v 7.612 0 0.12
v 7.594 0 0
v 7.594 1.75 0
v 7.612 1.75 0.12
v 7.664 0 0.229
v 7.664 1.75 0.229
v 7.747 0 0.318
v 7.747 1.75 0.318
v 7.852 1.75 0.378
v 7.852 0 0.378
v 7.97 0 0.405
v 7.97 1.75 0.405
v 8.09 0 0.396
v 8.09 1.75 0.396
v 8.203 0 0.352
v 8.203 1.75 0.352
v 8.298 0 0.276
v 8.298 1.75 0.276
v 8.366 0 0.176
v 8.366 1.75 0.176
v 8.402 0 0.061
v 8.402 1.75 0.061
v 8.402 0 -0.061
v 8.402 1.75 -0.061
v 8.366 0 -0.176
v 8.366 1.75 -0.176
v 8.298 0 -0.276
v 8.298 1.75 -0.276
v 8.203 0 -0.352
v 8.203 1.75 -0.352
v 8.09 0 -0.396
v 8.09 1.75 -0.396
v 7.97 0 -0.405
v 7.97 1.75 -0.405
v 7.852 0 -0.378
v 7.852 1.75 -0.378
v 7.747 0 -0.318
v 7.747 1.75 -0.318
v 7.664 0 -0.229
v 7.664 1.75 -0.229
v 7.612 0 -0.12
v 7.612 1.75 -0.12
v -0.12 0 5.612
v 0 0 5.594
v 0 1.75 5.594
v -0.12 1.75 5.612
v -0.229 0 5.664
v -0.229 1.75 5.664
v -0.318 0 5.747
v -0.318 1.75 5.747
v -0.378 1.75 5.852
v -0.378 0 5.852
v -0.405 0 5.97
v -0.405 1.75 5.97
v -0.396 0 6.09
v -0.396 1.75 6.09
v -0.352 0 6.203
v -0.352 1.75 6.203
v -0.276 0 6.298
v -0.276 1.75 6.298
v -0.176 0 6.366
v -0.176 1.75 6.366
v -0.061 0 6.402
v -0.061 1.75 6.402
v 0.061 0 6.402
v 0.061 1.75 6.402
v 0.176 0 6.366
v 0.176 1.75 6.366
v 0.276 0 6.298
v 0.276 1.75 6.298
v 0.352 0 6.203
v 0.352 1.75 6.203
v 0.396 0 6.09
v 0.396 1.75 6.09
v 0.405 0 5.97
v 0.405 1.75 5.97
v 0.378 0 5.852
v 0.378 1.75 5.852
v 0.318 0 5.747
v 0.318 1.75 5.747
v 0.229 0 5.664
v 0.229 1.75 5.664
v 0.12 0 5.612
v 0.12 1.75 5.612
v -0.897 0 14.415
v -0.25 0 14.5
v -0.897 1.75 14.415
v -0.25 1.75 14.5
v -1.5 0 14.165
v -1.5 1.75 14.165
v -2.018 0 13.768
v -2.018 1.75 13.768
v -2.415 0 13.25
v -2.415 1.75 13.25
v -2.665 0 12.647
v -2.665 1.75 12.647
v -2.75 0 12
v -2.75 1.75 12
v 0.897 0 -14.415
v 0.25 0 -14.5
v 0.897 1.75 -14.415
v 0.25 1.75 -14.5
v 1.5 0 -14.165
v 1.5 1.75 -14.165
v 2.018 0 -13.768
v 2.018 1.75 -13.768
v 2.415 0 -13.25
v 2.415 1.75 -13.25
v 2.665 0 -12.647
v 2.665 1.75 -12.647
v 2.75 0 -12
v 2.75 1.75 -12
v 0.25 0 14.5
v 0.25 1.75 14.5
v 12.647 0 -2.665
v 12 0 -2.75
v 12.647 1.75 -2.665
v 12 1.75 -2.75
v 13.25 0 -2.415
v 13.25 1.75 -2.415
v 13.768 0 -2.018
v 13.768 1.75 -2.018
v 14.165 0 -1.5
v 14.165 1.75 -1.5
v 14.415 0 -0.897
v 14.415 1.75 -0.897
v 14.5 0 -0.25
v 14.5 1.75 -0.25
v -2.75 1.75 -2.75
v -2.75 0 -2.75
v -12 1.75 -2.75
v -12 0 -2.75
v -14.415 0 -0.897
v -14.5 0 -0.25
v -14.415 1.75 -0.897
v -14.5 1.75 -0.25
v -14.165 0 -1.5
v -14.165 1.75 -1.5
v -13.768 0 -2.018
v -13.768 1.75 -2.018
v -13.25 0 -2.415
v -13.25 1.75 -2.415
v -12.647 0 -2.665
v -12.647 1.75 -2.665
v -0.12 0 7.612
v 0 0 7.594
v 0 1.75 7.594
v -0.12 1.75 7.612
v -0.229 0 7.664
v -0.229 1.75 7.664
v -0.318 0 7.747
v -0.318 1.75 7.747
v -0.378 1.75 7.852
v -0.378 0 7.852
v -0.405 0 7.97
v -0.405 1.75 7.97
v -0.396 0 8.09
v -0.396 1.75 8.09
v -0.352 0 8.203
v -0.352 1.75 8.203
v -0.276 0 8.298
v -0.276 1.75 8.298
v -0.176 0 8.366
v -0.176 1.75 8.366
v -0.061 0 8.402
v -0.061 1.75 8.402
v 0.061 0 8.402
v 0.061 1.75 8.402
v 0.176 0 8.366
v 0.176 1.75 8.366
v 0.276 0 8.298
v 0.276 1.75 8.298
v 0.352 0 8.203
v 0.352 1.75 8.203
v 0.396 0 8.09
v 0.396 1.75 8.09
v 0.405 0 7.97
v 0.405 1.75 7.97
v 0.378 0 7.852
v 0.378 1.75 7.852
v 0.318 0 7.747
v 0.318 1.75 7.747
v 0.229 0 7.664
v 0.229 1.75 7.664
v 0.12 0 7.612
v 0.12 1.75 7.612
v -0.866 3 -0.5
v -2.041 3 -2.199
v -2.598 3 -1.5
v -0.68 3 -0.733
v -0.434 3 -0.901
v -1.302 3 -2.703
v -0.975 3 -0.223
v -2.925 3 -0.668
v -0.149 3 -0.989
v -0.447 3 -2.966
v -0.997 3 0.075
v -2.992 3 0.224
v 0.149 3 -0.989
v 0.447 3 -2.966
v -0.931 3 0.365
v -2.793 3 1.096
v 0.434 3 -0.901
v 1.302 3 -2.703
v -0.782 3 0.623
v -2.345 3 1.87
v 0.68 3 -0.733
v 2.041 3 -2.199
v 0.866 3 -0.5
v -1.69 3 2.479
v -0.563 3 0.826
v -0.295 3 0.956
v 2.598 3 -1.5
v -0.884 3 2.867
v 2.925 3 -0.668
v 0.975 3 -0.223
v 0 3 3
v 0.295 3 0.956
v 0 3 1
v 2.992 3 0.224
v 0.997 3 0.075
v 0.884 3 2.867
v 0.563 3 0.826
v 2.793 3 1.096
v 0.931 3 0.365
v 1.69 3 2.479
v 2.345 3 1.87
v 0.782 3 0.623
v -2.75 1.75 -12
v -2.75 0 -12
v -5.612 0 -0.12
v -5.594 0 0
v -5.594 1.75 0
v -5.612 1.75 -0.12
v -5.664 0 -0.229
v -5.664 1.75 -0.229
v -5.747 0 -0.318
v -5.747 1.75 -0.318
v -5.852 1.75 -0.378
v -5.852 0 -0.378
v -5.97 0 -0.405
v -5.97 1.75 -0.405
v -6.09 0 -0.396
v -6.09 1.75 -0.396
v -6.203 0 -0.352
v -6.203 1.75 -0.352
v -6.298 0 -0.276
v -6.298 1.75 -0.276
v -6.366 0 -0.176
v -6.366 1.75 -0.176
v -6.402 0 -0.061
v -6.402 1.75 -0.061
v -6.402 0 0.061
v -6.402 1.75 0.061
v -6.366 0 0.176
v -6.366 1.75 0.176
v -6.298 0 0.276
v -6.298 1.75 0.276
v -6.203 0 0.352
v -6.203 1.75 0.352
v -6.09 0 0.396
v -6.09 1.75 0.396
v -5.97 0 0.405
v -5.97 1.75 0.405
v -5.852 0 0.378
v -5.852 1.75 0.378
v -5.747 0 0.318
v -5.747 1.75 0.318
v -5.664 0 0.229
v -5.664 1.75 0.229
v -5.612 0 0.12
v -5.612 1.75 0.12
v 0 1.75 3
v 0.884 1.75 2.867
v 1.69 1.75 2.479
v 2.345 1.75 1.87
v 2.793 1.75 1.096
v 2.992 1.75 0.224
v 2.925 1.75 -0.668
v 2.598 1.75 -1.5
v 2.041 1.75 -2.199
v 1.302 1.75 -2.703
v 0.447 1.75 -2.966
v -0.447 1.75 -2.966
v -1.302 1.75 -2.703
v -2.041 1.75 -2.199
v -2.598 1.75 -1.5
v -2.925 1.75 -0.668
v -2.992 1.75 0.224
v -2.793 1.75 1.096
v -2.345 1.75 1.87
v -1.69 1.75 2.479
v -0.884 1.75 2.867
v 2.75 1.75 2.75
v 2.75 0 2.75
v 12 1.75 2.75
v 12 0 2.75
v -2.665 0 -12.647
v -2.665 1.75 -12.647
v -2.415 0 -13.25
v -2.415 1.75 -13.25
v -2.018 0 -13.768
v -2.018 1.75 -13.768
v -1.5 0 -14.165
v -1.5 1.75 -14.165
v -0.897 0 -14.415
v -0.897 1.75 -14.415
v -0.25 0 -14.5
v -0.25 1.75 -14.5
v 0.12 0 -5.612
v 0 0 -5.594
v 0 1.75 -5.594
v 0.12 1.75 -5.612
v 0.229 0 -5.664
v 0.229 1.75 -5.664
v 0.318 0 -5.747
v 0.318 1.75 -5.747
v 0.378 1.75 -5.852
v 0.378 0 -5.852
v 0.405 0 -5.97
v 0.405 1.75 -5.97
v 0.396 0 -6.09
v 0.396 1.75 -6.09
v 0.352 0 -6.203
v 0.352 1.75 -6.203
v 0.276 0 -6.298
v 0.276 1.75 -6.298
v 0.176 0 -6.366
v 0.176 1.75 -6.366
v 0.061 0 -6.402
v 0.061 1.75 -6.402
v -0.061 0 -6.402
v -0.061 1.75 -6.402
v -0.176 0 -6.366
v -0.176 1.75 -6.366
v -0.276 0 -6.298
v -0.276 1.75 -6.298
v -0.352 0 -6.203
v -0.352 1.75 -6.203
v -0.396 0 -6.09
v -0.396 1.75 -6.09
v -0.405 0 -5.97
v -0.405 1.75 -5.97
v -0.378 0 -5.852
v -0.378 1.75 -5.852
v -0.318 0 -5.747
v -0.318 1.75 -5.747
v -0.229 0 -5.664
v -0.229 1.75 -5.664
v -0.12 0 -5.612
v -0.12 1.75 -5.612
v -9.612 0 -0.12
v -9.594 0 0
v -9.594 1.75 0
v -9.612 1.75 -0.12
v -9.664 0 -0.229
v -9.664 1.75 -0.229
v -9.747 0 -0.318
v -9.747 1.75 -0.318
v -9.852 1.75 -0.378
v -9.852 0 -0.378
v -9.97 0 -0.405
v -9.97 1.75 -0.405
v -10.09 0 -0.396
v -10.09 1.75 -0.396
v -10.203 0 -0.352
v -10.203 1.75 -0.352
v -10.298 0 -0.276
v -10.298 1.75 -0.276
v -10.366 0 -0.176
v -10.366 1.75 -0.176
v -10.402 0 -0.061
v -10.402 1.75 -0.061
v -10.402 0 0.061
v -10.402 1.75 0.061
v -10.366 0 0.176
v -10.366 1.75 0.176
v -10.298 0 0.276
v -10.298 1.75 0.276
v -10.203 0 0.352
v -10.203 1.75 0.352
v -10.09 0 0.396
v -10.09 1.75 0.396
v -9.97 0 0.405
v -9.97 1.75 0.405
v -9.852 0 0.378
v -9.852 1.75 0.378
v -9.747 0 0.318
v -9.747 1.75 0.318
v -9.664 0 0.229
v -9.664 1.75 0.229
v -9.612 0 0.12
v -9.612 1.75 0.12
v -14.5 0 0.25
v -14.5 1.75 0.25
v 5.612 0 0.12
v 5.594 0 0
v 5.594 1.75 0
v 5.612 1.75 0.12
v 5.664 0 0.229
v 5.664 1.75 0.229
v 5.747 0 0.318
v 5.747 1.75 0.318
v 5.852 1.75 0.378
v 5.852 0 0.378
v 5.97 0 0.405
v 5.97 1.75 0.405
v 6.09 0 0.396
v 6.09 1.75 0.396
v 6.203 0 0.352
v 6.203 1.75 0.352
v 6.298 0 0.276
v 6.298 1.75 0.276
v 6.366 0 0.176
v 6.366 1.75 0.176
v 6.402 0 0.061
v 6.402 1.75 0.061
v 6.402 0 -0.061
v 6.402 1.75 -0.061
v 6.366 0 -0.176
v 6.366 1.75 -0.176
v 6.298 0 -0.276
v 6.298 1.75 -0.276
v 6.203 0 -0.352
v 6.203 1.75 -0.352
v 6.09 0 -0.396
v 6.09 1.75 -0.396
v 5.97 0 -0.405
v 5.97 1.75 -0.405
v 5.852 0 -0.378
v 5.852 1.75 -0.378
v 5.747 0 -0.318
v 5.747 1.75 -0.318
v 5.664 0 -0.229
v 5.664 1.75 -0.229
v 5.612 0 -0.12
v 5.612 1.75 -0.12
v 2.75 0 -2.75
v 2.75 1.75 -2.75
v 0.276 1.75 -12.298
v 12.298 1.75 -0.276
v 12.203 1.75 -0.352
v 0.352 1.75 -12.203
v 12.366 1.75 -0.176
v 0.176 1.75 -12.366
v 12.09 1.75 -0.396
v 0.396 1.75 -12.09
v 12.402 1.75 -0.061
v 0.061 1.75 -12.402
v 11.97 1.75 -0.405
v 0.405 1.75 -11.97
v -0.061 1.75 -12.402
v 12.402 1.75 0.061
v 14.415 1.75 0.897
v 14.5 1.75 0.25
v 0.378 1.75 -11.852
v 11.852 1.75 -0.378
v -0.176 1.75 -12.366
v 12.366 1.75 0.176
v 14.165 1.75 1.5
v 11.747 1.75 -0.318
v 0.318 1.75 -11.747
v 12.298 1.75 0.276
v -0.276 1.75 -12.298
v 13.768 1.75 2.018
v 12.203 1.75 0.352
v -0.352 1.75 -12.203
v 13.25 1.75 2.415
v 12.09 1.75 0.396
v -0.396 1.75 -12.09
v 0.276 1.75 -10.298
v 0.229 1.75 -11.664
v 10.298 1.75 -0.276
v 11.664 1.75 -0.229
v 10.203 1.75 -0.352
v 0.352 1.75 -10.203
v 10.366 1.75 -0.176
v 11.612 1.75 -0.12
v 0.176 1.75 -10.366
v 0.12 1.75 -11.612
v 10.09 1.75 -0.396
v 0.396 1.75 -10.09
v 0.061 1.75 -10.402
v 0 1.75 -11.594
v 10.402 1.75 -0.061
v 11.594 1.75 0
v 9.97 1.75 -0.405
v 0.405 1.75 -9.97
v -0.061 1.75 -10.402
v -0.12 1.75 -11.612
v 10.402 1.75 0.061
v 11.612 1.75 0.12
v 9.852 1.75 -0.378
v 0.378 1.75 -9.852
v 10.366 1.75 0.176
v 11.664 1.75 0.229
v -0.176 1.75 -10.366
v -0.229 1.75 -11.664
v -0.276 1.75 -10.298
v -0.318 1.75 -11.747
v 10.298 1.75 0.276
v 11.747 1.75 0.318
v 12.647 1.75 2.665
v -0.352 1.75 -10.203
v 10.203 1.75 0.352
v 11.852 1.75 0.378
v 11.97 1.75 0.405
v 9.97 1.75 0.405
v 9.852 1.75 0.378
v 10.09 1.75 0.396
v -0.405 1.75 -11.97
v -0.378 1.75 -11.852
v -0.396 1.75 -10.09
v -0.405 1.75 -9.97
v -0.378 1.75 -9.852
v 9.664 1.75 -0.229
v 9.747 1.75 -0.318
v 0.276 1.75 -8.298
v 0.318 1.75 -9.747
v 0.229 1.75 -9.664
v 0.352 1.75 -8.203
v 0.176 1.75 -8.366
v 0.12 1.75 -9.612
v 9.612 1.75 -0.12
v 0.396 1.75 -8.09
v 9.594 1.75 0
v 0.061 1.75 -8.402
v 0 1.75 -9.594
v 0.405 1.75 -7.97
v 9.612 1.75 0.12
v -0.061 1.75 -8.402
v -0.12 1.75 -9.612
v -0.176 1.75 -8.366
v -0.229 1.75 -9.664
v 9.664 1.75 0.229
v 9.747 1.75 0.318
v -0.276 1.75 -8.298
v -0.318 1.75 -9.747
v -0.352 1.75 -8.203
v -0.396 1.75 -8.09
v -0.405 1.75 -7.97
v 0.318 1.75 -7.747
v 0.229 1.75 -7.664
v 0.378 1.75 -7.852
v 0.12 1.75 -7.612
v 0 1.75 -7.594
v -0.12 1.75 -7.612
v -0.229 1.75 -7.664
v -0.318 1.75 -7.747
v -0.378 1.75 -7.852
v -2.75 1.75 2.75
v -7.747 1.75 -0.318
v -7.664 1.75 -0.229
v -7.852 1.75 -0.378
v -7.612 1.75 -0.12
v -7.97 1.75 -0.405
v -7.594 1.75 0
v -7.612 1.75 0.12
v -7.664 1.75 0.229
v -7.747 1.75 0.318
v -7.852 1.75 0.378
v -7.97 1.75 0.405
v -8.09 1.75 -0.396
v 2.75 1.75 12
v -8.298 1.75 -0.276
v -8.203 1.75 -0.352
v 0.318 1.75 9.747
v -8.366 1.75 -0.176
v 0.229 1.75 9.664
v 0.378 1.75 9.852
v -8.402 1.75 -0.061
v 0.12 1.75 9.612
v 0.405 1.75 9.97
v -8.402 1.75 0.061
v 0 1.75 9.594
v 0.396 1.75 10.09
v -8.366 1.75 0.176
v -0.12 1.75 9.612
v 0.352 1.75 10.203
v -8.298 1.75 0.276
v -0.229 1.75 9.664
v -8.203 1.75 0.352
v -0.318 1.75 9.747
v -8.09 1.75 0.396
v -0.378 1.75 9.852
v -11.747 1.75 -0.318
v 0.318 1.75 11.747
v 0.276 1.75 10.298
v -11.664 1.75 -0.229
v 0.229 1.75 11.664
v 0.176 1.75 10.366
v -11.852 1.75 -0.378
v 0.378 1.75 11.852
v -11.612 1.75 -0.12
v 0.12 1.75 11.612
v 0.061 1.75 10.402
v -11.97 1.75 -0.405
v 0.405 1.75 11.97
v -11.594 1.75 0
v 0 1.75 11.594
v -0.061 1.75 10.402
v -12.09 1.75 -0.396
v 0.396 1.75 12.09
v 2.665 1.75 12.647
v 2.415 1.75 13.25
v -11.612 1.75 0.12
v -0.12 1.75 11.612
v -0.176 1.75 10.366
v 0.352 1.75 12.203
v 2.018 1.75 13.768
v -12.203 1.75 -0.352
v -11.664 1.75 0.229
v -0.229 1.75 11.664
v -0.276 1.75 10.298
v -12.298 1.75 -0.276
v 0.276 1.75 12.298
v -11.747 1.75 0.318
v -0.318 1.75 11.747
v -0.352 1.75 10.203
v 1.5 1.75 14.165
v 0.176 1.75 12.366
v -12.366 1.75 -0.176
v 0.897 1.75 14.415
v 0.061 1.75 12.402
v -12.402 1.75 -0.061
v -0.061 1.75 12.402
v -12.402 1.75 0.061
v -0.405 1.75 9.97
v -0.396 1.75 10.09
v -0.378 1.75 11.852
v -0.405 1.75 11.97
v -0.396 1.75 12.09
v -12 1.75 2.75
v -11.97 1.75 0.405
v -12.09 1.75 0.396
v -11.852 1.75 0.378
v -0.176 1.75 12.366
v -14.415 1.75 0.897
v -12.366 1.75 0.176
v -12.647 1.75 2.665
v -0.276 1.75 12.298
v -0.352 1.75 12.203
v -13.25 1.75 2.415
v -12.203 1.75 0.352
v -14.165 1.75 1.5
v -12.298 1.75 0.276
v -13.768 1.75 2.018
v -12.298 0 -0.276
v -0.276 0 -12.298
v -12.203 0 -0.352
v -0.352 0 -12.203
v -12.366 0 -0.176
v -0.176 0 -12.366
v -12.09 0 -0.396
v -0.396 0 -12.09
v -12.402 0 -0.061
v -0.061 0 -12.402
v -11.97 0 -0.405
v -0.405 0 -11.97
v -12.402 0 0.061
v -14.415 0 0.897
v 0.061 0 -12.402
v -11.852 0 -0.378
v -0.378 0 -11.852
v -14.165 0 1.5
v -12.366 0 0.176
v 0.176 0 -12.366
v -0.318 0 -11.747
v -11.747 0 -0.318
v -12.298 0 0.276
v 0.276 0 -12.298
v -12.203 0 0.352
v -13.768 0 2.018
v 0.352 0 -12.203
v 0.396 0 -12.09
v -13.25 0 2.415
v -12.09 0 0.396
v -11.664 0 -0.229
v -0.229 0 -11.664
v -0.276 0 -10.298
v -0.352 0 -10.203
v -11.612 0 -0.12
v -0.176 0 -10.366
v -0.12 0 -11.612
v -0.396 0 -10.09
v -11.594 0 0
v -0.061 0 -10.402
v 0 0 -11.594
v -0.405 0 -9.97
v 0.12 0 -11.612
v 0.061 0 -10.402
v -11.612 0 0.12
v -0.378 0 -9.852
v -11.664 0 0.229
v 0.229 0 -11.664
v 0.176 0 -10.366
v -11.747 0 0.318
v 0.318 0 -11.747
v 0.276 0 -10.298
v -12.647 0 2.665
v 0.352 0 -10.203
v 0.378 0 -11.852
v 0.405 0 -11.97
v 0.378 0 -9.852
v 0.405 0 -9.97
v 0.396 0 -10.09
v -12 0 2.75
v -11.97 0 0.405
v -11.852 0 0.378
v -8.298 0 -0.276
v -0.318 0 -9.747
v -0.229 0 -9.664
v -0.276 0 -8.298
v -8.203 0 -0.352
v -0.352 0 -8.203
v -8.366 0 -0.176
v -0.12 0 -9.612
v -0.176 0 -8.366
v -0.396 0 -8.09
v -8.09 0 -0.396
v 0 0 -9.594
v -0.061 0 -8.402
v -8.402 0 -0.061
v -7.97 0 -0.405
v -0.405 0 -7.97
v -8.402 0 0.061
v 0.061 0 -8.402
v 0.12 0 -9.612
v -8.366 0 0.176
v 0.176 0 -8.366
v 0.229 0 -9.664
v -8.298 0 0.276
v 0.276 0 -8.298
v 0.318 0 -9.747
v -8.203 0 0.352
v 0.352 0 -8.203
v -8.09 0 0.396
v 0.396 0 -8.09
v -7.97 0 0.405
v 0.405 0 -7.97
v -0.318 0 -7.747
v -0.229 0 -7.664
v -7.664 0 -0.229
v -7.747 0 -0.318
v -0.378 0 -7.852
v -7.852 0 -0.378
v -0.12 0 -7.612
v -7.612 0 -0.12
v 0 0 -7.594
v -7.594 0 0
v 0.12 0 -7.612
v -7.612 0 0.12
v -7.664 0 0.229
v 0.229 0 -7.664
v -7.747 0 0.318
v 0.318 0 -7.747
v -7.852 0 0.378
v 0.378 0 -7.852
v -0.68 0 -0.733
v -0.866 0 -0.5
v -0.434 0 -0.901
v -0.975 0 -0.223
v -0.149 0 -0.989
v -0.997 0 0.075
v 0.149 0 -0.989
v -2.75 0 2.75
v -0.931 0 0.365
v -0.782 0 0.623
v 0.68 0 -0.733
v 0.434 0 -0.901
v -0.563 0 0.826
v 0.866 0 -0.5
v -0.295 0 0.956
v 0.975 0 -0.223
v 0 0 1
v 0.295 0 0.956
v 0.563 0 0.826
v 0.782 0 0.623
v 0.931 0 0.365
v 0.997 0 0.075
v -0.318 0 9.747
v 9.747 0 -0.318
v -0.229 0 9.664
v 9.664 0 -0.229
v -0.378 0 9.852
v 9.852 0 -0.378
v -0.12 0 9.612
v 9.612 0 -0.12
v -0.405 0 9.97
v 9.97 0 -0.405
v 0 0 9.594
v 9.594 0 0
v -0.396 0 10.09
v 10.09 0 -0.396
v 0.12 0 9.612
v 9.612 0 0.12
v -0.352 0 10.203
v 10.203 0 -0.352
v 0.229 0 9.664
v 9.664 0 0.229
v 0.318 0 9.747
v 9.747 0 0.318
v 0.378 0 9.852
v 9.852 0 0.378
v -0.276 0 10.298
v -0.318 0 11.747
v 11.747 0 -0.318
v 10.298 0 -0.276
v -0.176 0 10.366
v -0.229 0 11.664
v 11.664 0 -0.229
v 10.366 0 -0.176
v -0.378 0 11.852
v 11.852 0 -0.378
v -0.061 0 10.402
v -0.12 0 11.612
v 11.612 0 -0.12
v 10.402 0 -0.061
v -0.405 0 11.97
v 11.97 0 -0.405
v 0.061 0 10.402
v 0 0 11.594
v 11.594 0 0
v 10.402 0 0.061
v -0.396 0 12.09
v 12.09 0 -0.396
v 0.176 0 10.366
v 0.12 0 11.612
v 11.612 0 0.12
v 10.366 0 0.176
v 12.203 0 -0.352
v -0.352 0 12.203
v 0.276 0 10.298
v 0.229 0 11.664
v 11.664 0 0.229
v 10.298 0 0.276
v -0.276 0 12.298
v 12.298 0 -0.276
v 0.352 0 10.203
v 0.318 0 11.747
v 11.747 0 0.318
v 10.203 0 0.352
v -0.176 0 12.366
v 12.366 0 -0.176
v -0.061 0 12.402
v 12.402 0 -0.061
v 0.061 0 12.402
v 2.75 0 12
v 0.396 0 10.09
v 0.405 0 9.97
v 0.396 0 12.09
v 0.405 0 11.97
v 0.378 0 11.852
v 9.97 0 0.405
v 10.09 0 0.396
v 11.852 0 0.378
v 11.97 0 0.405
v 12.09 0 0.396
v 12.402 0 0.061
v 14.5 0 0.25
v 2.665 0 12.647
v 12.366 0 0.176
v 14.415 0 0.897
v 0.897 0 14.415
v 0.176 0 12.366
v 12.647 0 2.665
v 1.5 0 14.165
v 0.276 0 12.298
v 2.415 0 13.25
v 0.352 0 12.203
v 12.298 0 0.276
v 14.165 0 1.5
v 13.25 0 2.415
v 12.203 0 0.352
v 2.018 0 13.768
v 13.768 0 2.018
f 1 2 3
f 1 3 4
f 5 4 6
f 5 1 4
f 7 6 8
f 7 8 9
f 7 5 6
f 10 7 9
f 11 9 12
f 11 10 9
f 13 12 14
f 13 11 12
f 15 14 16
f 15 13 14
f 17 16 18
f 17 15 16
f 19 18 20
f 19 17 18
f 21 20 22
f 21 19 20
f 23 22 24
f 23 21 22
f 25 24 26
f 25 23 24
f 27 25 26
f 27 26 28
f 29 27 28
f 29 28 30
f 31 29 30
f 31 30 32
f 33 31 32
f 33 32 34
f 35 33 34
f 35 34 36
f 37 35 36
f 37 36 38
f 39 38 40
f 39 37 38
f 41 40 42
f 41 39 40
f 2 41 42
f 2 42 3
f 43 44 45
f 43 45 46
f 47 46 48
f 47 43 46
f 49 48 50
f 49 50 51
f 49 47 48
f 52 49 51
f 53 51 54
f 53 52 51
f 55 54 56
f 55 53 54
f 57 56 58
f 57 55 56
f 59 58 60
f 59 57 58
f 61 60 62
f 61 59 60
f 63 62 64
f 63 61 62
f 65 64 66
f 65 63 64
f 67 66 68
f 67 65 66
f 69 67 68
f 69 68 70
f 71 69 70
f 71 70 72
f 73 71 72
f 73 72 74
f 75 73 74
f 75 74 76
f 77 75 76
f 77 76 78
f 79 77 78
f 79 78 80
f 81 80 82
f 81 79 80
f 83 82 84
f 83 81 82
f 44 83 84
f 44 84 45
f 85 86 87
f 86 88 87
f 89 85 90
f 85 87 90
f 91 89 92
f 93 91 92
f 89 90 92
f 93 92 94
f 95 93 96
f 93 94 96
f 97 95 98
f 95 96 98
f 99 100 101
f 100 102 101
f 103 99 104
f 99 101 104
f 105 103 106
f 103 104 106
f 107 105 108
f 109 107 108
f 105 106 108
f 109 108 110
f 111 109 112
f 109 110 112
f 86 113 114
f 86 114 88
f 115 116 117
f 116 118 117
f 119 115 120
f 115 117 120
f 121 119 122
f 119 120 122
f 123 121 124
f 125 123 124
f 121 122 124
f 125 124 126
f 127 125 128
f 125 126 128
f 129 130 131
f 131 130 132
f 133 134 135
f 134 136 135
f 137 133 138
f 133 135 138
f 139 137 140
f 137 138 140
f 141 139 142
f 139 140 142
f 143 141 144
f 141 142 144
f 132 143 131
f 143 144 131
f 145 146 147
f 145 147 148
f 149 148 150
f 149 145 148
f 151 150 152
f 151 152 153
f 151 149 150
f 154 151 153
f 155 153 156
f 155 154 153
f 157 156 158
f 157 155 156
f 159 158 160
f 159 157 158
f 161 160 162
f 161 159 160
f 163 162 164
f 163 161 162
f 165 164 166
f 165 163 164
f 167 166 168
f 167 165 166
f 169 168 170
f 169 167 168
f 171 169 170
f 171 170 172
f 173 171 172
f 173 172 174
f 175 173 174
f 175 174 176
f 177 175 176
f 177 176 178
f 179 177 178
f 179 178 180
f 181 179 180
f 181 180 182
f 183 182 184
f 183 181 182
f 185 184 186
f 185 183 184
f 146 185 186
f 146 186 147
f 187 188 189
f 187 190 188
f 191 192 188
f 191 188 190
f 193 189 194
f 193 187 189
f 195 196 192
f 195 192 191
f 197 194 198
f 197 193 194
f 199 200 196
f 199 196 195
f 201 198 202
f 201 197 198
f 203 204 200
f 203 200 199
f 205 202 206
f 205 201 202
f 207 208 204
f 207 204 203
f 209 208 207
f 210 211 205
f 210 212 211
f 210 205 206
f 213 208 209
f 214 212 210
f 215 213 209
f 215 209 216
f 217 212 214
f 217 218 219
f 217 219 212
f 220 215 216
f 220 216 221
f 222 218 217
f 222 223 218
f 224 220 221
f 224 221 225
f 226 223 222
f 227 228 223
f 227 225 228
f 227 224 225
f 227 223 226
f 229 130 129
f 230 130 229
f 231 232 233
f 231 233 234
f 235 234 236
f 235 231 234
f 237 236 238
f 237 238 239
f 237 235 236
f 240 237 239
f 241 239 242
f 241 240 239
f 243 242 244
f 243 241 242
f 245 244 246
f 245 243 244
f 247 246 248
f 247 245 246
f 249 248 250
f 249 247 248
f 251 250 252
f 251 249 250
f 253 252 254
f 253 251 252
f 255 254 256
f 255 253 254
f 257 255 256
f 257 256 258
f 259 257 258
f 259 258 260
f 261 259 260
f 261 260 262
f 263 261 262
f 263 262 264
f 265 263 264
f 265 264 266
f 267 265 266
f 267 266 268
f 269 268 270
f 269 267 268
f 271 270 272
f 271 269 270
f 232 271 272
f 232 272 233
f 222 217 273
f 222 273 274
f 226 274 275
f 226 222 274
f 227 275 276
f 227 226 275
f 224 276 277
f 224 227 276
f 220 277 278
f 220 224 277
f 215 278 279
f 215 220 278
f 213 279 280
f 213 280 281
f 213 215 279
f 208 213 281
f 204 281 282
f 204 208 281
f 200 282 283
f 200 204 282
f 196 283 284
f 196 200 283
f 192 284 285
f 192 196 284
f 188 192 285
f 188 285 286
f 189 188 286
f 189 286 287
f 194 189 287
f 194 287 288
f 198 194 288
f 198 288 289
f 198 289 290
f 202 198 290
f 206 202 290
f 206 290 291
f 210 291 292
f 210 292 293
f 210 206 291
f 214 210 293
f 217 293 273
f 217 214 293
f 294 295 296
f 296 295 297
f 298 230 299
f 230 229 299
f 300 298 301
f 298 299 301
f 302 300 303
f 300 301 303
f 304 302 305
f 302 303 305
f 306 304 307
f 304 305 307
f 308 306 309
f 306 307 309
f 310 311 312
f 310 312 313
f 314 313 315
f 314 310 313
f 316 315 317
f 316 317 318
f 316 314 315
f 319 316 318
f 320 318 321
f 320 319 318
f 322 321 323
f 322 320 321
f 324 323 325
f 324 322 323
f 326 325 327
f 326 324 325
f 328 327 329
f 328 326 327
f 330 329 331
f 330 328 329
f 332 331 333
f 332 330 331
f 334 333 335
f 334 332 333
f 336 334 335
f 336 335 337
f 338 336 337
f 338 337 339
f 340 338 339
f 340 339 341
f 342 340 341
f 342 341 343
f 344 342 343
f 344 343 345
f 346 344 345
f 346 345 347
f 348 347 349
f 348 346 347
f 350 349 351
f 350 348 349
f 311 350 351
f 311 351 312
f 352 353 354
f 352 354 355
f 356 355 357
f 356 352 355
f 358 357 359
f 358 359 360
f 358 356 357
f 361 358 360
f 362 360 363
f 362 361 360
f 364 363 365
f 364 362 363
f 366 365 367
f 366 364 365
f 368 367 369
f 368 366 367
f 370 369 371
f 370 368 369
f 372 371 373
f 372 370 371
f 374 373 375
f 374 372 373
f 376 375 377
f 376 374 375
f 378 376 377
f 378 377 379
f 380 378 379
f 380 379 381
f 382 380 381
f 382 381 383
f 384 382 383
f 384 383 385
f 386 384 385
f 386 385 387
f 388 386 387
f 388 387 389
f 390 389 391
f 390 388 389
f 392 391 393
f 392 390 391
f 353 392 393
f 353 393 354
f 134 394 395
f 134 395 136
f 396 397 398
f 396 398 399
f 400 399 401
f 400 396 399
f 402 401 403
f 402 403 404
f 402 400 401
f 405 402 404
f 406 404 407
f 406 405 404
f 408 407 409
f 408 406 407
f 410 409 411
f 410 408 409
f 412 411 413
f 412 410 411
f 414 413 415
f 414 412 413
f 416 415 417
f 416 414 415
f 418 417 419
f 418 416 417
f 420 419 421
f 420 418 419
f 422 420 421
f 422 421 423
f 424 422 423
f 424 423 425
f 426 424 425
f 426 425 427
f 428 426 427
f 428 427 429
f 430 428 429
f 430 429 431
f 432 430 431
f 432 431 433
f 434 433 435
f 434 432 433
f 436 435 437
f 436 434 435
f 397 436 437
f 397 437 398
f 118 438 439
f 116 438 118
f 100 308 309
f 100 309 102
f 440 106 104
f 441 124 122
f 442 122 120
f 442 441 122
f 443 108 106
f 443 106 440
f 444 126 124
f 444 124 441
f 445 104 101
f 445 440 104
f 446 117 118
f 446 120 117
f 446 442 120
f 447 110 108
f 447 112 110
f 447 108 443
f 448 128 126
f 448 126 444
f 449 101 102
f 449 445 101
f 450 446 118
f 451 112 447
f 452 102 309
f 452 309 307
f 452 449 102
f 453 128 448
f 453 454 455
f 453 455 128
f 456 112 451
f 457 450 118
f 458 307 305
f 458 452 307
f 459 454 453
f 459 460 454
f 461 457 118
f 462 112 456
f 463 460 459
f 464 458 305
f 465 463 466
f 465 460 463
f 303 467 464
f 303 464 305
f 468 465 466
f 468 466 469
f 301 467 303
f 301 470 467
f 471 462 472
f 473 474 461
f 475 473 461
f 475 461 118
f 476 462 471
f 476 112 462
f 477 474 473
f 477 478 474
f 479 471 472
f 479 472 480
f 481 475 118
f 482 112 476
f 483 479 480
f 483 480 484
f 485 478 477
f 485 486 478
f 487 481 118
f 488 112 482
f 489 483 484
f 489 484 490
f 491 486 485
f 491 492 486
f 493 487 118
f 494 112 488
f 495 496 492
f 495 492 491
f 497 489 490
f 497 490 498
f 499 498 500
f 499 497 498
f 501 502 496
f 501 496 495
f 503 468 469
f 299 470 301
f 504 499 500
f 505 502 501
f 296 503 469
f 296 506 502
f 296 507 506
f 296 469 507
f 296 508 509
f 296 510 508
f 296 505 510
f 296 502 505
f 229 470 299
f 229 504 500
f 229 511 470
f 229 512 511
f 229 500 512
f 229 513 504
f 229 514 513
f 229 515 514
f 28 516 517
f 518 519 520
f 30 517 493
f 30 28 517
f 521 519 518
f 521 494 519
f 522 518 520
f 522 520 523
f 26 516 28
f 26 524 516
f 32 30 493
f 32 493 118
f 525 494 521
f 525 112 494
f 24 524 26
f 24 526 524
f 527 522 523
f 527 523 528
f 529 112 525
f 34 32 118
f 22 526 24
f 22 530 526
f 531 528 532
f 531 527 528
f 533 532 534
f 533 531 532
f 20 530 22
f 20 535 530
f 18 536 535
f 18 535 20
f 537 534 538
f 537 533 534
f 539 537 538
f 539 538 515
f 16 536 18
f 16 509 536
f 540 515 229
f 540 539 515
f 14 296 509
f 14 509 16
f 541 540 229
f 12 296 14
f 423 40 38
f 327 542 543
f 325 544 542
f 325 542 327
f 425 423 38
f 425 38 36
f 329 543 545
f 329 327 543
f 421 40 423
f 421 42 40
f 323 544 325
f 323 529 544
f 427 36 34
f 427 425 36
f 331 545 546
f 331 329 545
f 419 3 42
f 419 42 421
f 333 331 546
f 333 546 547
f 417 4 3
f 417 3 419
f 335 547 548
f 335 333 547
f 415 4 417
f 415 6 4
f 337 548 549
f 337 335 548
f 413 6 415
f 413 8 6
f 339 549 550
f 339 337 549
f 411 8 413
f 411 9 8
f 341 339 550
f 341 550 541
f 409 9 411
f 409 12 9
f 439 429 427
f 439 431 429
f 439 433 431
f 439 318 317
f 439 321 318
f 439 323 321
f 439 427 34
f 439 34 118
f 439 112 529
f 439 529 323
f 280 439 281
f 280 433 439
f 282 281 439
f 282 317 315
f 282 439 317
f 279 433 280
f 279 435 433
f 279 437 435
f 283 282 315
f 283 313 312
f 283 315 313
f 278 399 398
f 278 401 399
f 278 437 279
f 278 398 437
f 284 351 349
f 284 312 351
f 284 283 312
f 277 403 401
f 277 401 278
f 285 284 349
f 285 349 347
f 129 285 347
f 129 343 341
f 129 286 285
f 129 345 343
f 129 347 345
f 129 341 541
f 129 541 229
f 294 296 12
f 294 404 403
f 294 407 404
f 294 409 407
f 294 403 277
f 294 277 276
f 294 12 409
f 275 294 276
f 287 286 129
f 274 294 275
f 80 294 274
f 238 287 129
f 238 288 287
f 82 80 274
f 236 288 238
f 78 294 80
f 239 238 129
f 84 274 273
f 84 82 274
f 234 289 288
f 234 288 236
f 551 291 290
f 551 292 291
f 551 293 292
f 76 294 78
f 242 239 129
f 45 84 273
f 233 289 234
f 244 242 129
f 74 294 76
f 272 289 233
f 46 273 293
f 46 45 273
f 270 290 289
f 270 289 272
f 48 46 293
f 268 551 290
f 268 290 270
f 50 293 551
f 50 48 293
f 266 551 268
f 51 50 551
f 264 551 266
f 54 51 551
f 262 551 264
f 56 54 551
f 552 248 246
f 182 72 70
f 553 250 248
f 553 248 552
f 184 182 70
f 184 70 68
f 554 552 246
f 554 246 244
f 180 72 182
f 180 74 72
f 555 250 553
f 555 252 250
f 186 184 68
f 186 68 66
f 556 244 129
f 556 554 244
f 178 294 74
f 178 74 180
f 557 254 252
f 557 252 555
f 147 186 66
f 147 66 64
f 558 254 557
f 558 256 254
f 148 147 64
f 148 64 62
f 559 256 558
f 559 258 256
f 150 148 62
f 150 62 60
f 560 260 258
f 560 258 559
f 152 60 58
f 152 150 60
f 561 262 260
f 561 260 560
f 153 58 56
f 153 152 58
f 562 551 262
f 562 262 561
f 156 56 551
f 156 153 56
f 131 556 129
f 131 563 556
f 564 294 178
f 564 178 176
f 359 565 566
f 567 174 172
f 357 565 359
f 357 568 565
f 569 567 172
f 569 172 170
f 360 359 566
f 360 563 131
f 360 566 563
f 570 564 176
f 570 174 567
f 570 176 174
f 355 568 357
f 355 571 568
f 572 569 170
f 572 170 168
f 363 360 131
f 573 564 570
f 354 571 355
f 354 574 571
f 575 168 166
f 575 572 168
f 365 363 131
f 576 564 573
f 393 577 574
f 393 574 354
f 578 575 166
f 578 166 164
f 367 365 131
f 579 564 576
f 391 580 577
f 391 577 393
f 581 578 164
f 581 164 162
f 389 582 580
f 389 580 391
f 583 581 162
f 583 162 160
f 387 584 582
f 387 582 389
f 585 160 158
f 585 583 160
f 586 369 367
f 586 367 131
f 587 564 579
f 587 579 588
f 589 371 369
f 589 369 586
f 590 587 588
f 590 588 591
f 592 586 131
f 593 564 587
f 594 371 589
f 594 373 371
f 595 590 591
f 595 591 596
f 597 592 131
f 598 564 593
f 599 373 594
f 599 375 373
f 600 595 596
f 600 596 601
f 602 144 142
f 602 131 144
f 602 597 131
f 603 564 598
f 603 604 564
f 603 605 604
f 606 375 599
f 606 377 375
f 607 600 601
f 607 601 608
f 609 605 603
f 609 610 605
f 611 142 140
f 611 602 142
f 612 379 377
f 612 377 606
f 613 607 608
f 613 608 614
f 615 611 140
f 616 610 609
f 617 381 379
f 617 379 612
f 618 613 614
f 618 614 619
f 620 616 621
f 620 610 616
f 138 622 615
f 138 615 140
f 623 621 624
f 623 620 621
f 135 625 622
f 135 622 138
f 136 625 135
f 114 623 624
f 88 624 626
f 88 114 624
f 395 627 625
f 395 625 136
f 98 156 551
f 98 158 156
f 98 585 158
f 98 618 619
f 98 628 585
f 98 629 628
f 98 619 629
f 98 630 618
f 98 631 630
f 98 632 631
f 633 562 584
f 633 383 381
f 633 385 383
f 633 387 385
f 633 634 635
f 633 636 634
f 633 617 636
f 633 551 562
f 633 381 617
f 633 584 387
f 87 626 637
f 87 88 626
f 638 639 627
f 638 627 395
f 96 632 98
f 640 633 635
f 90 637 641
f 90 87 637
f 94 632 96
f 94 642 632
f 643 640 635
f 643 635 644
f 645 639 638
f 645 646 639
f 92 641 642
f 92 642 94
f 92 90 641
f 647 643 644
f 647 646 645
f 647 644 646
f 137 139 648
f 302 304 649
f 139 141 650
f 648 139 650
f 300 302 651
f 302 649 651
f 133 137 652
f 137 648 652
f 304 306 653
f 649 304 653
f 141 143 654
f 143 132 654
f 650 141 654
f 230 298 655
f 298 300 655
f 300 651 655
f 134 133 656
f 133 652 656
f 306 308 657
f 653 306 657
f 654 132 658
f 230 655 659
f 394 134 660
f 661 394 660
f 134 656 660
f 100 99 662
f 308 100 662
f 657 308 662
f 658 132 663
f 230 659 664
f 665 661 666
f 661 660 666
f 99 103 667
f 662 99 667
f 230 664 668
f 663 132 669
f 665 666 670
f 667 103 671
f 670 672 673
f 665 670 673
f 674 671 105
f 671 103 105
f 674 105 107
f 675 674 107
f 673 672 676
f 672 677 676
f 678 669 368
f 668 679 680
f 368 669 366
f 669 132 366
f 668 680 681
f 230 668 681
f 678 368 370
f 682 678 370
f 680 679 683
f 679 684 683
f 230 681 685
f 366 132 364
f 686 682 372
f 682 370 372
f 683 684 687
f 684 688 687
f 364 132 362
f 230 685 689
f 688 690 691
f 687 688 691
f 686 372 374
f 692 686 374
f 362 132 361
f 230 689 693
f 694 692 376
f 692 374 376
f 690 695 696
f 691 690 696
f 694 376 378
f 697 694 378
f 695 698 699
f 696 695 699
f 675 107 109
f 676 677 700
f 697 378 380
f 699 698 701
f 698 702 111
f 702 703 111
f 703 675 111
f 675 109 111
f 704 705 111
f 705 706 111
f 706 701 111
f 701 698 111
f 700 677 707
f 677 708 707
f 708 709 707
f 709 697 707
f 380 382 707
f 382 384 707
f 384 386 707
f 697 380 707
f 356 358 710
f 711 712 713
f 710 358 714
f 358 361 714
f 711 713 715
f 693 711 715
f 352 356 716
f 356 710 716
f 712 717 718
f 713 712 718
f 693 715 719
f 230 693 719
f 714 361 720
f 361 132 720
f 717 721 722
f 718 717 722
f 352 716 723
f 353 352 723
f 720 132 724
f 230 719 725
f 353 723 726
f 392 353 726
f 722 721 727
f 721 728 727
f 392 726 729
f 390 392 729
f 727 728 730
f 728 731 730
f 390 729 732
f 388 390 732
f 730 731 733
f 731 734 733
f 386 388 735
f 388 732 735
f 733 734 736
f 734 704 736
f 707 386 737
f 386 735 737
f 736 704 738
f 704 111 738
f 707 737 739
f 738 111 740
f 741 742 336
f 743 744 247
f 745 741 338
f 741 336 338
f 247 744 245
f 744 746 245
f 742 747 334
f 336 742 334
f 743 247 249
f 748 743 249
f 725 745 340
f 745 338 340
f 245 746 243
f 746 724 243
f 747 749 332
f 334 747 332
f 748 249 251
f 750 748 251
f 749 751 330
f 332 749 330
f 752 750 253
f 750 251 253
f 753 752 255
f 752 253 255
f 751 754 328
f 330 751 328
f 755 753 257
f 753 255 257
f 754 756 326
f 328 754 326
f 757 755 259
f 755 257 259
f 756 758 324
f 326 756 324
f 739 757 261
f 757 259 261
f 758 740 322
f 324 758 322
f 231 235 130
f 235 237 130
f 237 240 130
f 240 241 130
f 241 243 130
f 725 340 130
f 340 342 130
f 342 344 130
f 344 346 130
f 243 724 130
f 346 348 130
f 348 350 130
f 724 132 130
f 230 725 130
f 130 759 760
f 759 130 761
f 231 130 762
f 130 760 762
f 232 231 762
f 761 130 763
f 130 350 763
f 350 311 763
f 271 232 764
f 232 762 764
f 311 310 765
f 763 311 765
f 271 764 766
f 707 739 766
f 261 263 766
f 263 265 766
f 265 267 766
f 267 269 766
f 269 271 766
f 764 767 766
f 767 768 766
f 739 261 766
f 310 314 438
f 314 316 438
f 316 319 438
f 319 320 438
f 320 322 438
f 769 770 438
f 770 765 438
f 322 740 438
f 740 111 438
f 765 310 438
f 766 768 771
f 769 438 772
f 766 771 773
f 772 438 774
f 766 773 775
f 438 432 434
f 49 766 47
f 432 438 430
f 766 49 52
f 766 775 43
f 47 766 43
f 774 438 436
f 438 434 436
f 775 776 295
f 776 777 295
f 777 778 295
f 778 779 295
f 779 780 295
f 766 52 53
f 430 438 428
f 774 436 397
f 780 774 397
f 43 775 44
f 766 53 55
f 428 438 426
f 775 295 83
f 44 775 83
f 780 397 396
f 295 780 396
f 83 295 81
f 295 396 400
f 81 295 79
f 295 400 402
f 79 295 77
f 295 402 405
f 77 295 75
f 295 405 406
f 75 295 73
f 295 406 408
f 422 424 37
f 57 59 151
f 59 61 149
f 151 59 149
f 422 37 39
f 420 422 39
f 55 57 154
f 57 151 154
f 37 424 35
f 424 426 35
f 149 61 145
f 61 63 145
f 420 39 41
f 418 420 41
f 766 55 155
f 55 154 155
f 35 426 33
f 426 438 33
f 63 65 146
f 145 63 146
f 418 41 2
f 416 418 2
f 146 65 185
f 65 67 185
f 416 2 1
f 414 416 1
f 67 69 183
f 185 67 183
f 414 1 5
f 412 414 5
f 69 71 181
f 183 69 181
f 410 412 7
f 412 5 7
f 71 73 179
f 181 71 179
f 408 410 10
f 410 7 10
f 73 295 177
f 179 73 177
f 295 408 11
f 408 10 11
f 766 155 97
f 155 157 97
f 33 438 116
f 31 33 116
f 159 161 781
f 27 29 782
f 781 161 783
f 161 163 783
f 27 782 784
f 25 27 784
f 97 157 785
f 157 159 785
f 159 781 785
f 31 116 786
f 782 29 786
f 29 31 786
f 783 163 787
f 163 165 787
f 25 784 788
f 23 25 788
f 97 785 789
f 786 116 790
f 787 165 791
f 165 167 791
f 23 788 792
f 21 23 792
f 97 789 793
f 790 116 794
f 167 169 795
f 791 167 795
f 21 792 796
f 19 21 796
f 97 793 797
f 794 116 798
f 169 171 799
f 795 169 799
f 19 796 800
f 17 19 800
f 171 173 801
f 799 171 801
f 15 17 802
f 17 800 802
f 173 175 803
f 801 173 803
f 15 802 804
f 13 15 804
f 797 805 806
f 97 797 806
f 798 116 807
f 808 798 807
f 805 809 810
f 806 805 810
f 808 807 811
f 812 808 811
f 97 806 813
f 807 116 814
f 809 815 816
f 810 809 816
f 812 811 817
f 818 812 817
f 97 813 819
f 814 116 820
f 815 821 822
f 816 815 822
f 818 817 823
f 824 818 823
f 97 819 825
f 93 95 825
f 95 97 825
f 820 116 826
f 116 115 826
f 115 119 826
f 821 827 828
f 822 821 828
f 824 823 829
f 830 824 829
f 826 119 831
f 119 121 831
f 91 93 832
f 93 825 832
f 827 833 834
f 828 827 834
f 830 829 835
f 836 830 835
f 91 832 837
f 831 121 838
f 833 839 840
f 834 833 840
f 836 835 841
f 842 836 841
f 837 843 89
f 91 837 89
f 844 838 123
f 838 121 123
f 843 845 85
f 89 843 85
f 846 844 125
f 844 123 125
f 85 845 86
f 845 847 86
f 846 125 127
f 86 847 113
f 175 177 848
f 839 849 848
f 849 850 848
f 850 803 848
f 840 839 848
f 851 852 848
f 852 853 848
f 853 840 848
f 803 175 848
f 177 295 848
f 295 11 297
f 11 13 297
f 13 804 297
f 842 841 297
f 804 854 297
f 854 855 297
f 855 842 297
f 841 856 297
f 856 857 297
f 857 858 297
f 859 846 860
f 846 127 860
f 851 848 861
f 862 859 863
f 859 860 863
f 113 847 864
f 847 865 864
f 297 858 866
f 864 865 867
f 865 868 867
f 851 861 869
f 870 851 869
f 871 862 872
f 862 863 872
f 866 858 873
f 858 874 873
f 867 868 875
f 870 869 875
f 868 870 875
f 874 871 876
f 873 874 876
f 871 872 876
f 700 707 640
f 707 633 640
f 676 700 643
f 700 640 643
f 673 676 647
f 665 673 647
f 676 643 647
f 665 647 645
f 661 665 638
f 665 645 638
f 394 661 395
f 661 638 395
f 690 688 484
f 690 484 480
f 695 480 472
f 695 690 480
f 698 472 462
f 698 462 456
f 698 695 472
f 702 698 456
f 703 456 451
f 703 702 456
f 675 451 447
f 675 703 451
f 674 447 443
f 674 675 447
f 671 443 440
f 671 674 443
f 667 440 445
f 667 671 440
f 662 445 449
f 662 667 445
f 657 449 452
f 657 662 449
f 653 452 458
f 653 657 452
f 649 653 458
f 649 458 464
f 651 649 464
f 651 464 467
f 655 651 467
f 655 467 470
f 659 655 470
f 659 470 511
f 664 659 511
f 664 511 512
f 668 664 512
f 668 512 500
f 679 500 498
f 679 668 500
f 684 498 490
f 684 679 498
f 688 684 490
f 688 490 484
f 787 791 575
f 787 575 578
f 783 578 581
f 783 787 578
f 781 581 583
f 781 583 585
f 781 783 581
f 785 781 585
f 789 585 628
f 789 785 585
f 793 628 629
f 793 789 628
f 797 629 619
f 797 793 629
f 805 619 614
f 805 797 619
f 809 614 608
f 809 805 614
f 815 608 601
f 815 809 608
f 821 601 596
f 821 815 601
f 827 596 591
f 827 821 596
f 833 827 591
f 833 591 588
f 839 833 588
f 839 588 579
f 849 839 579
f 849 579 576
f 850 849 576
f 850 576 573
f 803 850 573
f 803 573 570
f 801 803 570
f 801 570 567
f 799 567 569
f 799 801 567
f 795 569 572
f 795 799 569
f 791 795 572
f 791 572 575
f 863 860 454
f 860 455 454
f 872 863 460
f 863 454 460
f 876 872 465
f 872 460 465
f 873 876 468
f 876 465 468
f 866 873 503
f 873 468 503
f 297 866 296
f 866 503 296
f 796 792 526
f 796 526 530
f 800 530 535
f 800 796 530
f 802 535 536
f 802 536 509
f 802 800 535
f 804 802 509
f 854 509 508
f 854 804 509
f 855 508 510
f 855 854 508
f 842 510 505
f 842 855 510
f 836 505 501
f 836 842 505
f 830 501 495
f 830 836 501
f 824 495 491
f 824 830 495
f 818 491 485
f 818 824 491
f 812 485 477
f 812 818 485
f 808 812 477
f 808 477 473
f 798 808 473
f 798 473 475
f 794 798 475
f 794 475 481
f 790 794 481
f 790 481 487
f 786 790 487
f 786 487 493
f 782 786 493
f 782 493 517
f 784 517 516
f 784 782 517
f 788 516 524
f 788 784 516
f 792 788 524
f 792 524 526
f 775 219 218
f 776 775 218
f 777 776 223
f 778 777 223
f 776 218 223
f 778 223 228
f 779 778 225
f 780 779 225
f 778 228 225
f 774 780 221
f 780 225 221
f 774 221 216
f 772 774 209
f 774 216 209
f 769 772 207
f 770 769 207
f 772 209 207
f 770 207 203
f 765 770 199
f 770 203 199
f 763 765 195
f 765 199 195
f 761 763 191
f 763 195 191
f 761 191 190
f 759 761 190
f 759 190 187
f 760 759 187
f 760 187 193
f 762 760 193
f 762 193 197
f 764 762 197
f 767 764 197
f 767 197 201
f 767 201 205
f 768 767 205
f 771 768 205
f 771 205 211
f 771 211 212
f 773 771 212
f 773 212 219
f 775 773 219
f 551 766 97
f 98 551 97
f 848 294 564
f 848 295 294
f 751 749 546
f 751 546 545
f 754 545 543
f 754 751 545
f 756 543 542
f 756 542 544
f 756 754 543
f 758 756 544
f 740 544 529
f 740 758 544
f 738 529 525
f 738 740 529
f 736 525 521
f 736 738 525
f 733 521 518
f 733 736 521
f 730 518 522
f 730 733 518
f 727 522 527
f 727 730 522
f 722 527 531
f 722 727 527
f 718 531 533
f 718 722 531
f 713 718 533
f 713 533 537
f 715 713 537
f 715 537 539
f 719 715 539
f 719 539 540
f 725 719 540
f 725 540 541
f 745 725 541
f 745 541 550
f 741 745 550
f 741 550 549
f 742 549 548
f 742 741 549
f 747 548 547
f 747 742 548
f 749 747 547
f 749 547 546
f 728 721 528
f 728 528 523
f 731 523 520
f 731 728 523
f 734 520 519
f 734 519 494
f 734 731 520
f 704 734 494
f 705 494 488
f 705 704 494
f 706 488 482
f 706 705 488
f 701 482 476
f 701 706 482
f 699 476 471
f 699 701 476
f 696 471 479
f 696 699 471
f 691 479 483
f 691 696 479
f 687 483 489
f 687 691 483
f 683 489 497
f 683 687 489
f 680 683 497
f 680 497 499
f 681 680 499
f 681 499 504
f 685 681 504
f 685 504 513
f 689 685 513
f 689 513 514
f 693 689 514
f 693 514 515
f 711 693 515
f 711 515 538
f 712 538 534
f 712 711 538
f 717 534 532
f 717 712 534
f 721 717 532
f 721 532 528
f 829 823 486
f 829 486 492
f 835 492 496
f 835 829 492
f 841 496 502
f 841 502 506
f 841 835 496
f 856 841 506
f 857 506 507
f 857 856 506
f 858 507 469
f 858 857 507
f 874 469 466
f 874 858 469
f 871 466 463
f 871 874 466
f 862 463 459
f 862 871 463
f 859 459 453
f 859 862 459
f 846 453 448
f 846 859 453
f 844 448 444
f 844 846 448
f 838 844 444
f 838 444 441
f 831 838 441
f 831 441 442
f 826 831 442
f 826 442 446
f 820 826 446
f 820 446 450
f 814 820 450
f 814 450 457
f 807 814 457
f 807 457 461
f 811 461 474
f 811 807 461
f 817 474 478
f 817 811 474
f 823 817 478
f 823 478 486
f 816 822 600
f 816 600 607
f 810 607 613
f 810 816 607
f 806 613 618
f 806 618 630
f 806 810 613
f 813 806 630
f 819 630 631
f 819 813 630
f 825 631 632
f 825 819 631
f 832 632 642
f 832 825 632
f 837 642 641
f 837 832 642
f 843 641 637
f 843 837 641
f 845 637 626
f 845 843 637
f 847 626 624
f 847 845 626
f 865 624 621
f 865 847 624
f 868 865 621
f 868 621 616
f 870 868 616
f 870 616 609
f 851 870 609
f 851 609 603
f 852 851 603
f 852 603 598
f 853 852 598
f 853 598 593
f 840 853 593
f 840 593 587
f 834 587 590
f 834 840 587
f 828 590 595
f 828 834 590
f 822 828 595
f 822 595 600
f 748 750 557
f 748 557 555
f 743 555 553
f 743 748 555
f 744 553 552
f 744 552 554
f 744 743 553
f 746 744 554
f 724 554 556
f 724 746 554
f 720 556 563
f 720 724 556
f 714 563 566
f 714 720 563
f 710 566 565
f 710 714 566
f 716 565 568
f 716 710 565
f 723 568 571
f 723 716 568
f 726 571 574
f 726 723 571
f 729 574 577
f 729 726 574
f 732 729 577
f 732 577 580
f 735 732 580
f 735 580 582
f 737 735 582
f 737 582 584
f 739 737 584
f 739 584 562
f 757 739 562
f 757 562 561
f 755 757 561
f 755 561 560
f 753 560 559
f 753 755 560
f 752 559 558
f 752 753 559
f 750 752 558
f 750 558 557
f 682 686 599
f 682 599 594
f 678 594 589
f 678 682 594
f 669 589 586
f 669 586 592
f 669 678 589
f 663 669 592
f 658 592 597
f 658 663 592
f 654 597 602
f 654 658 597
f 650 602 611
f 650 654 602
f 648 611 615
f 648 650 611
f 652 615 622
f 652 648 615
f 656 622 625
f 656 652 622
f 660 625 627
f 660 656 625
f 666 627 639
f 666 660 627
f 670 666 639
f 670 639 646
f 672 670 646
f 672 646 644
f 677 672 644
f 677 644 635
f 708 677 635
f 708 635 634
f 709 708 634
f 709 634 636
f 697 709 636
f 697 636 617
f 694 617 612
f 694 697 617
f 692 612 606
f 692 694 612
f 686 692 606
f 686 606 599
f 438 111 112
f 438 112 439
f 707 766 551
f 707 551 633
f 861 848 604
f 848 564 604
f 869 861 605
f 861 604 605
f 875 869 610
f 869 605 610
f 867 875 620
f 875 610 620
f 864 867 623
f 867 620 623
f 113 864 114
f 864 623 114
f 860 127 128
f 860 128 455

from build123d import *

# Parameters (mm, degrees)
SKETCH1_W                = 5.5
SKETCH1_H                = 14.5
SKETCH1_R                = 0.4064
BOSS_EXTRUDE1_DEPTH      = 1.75
FILLET1_R                = 2.5
CIRPATTERN1_COUNT        = 4
FILLET1_OF_CIRPATTERN1_R = 2.5
CUT_EXTRUDE1_REACH       = 22.581
SKETCH2_R                = 1
BOSS_EXTRUDE2_START      = 1.25
SKETCH3_R                = 3
SKETCH3_R_2              = 1
BOSS_EXTRUDE2_DEPTH      = 1.25


with BuildPart() as part:
    # Sketch1 → Boss-Extrude1 (new body)
    with BuildSketch(Plane(origin=(0, 0, 0), x_dir=(1, 0, 0), z_dir=(0, 1, 0))):
        with Locations((0, 7.25)):
            Rectangle(SKETCH1_W, SKETCH1_H)
        with Locations((0, 12)):
            Circle(SKETCH1_R, mode=Mode.SUBTRACT)
        with Locations((0, 10)):
            Circle(SKETCH1_R, mode=Mode.SUBTRACT)
        with Locations((0, 8)):
            Circle(SKETCH1_R, mode=Mode.SUBTRACT)
        with Locations((0, 6)):
            Circle(SKETCH1_R, mode=Mode.SUBTRACT)
    boss_extrude1 = extrude(amount=BOSS_EXTRUDE1_DEPTH)

    # Fillet1
    fillet1_edges = [part.edges().sort_by_distance(p)[0] for p in [
        (-2.75, 0.875, -14.5),
        (2.75, 0.875, -14.5),
    ]]
    fillet(fillet1_edges, radius=FILLET1_R)

    # CirPattern1: Boss-Extrude1 ×4 about axis
    cirpattern1_axis = Axis((0, 0, 0), (0, 1, 0))
    for i in range(1, CIRPATTERN1_COUNT):
        add(boss_extrude1.rotate(cirpattern1_axis, i * 360 / CIRPATTERN1_COUNT))

    # Fillet1 of CirPattern1
    fillet1_of_cirpattern1_edges = [part.edges().sort_by_distance(p)[0] for p in [
        (-14.5, 0.875, 2.75),
        (-14.5, 0.875, -2.75),
        (2.75, 0.875, 14.5),
        (-2.75, 0.875, 14.5),
        (14.5, 0.875, -2.75),
        (14.5, 0.875, 2.75),
    ]]
    fillet(fillet1_of_cirpattern1_edges, radius=FILLET1_OF_CIRPATTERN1_R)

    # Sketch2 → Cut-Extrude1 (cut, up to next)
    with BuildSketch(Plane(origin=(0, 1.75, 0), x_dir=(1, 0, 0), z_dir=(0, 1, 0)), mode=Mode.PRIVATE) as cut_extrude1_sk1:
        Circle(SKETCH2_R)
    cut_extrude1_tool1 = extrude(cut_extrude1_sk1.sketch, amount=-CUT_EXTRUDE1_REACH, mode=Mode.PRIVATE) & part.part
    add(cut_extrude1_tool1.solids().sort_by_distance((0, 1.75, 0))[0], mode=Mode.SUBTRACT)

    # Sketch3 → Boss-Extrude2 (add)
    with BuildSketch(Plane(origin=(0, 1.75, 0), x_dir=(1, 0, 0), z_dir=(0, 1, 0)).offset(BOSS_EXTRUDE2_START)):
        Circle(SKETCH3_R)
        Circle(SKETCH3_R_2, mode=Mode.SUBTRACT)
    extrude(amount=-BOSS_EXTRUDE2_DEPTH)


solid = part.part
